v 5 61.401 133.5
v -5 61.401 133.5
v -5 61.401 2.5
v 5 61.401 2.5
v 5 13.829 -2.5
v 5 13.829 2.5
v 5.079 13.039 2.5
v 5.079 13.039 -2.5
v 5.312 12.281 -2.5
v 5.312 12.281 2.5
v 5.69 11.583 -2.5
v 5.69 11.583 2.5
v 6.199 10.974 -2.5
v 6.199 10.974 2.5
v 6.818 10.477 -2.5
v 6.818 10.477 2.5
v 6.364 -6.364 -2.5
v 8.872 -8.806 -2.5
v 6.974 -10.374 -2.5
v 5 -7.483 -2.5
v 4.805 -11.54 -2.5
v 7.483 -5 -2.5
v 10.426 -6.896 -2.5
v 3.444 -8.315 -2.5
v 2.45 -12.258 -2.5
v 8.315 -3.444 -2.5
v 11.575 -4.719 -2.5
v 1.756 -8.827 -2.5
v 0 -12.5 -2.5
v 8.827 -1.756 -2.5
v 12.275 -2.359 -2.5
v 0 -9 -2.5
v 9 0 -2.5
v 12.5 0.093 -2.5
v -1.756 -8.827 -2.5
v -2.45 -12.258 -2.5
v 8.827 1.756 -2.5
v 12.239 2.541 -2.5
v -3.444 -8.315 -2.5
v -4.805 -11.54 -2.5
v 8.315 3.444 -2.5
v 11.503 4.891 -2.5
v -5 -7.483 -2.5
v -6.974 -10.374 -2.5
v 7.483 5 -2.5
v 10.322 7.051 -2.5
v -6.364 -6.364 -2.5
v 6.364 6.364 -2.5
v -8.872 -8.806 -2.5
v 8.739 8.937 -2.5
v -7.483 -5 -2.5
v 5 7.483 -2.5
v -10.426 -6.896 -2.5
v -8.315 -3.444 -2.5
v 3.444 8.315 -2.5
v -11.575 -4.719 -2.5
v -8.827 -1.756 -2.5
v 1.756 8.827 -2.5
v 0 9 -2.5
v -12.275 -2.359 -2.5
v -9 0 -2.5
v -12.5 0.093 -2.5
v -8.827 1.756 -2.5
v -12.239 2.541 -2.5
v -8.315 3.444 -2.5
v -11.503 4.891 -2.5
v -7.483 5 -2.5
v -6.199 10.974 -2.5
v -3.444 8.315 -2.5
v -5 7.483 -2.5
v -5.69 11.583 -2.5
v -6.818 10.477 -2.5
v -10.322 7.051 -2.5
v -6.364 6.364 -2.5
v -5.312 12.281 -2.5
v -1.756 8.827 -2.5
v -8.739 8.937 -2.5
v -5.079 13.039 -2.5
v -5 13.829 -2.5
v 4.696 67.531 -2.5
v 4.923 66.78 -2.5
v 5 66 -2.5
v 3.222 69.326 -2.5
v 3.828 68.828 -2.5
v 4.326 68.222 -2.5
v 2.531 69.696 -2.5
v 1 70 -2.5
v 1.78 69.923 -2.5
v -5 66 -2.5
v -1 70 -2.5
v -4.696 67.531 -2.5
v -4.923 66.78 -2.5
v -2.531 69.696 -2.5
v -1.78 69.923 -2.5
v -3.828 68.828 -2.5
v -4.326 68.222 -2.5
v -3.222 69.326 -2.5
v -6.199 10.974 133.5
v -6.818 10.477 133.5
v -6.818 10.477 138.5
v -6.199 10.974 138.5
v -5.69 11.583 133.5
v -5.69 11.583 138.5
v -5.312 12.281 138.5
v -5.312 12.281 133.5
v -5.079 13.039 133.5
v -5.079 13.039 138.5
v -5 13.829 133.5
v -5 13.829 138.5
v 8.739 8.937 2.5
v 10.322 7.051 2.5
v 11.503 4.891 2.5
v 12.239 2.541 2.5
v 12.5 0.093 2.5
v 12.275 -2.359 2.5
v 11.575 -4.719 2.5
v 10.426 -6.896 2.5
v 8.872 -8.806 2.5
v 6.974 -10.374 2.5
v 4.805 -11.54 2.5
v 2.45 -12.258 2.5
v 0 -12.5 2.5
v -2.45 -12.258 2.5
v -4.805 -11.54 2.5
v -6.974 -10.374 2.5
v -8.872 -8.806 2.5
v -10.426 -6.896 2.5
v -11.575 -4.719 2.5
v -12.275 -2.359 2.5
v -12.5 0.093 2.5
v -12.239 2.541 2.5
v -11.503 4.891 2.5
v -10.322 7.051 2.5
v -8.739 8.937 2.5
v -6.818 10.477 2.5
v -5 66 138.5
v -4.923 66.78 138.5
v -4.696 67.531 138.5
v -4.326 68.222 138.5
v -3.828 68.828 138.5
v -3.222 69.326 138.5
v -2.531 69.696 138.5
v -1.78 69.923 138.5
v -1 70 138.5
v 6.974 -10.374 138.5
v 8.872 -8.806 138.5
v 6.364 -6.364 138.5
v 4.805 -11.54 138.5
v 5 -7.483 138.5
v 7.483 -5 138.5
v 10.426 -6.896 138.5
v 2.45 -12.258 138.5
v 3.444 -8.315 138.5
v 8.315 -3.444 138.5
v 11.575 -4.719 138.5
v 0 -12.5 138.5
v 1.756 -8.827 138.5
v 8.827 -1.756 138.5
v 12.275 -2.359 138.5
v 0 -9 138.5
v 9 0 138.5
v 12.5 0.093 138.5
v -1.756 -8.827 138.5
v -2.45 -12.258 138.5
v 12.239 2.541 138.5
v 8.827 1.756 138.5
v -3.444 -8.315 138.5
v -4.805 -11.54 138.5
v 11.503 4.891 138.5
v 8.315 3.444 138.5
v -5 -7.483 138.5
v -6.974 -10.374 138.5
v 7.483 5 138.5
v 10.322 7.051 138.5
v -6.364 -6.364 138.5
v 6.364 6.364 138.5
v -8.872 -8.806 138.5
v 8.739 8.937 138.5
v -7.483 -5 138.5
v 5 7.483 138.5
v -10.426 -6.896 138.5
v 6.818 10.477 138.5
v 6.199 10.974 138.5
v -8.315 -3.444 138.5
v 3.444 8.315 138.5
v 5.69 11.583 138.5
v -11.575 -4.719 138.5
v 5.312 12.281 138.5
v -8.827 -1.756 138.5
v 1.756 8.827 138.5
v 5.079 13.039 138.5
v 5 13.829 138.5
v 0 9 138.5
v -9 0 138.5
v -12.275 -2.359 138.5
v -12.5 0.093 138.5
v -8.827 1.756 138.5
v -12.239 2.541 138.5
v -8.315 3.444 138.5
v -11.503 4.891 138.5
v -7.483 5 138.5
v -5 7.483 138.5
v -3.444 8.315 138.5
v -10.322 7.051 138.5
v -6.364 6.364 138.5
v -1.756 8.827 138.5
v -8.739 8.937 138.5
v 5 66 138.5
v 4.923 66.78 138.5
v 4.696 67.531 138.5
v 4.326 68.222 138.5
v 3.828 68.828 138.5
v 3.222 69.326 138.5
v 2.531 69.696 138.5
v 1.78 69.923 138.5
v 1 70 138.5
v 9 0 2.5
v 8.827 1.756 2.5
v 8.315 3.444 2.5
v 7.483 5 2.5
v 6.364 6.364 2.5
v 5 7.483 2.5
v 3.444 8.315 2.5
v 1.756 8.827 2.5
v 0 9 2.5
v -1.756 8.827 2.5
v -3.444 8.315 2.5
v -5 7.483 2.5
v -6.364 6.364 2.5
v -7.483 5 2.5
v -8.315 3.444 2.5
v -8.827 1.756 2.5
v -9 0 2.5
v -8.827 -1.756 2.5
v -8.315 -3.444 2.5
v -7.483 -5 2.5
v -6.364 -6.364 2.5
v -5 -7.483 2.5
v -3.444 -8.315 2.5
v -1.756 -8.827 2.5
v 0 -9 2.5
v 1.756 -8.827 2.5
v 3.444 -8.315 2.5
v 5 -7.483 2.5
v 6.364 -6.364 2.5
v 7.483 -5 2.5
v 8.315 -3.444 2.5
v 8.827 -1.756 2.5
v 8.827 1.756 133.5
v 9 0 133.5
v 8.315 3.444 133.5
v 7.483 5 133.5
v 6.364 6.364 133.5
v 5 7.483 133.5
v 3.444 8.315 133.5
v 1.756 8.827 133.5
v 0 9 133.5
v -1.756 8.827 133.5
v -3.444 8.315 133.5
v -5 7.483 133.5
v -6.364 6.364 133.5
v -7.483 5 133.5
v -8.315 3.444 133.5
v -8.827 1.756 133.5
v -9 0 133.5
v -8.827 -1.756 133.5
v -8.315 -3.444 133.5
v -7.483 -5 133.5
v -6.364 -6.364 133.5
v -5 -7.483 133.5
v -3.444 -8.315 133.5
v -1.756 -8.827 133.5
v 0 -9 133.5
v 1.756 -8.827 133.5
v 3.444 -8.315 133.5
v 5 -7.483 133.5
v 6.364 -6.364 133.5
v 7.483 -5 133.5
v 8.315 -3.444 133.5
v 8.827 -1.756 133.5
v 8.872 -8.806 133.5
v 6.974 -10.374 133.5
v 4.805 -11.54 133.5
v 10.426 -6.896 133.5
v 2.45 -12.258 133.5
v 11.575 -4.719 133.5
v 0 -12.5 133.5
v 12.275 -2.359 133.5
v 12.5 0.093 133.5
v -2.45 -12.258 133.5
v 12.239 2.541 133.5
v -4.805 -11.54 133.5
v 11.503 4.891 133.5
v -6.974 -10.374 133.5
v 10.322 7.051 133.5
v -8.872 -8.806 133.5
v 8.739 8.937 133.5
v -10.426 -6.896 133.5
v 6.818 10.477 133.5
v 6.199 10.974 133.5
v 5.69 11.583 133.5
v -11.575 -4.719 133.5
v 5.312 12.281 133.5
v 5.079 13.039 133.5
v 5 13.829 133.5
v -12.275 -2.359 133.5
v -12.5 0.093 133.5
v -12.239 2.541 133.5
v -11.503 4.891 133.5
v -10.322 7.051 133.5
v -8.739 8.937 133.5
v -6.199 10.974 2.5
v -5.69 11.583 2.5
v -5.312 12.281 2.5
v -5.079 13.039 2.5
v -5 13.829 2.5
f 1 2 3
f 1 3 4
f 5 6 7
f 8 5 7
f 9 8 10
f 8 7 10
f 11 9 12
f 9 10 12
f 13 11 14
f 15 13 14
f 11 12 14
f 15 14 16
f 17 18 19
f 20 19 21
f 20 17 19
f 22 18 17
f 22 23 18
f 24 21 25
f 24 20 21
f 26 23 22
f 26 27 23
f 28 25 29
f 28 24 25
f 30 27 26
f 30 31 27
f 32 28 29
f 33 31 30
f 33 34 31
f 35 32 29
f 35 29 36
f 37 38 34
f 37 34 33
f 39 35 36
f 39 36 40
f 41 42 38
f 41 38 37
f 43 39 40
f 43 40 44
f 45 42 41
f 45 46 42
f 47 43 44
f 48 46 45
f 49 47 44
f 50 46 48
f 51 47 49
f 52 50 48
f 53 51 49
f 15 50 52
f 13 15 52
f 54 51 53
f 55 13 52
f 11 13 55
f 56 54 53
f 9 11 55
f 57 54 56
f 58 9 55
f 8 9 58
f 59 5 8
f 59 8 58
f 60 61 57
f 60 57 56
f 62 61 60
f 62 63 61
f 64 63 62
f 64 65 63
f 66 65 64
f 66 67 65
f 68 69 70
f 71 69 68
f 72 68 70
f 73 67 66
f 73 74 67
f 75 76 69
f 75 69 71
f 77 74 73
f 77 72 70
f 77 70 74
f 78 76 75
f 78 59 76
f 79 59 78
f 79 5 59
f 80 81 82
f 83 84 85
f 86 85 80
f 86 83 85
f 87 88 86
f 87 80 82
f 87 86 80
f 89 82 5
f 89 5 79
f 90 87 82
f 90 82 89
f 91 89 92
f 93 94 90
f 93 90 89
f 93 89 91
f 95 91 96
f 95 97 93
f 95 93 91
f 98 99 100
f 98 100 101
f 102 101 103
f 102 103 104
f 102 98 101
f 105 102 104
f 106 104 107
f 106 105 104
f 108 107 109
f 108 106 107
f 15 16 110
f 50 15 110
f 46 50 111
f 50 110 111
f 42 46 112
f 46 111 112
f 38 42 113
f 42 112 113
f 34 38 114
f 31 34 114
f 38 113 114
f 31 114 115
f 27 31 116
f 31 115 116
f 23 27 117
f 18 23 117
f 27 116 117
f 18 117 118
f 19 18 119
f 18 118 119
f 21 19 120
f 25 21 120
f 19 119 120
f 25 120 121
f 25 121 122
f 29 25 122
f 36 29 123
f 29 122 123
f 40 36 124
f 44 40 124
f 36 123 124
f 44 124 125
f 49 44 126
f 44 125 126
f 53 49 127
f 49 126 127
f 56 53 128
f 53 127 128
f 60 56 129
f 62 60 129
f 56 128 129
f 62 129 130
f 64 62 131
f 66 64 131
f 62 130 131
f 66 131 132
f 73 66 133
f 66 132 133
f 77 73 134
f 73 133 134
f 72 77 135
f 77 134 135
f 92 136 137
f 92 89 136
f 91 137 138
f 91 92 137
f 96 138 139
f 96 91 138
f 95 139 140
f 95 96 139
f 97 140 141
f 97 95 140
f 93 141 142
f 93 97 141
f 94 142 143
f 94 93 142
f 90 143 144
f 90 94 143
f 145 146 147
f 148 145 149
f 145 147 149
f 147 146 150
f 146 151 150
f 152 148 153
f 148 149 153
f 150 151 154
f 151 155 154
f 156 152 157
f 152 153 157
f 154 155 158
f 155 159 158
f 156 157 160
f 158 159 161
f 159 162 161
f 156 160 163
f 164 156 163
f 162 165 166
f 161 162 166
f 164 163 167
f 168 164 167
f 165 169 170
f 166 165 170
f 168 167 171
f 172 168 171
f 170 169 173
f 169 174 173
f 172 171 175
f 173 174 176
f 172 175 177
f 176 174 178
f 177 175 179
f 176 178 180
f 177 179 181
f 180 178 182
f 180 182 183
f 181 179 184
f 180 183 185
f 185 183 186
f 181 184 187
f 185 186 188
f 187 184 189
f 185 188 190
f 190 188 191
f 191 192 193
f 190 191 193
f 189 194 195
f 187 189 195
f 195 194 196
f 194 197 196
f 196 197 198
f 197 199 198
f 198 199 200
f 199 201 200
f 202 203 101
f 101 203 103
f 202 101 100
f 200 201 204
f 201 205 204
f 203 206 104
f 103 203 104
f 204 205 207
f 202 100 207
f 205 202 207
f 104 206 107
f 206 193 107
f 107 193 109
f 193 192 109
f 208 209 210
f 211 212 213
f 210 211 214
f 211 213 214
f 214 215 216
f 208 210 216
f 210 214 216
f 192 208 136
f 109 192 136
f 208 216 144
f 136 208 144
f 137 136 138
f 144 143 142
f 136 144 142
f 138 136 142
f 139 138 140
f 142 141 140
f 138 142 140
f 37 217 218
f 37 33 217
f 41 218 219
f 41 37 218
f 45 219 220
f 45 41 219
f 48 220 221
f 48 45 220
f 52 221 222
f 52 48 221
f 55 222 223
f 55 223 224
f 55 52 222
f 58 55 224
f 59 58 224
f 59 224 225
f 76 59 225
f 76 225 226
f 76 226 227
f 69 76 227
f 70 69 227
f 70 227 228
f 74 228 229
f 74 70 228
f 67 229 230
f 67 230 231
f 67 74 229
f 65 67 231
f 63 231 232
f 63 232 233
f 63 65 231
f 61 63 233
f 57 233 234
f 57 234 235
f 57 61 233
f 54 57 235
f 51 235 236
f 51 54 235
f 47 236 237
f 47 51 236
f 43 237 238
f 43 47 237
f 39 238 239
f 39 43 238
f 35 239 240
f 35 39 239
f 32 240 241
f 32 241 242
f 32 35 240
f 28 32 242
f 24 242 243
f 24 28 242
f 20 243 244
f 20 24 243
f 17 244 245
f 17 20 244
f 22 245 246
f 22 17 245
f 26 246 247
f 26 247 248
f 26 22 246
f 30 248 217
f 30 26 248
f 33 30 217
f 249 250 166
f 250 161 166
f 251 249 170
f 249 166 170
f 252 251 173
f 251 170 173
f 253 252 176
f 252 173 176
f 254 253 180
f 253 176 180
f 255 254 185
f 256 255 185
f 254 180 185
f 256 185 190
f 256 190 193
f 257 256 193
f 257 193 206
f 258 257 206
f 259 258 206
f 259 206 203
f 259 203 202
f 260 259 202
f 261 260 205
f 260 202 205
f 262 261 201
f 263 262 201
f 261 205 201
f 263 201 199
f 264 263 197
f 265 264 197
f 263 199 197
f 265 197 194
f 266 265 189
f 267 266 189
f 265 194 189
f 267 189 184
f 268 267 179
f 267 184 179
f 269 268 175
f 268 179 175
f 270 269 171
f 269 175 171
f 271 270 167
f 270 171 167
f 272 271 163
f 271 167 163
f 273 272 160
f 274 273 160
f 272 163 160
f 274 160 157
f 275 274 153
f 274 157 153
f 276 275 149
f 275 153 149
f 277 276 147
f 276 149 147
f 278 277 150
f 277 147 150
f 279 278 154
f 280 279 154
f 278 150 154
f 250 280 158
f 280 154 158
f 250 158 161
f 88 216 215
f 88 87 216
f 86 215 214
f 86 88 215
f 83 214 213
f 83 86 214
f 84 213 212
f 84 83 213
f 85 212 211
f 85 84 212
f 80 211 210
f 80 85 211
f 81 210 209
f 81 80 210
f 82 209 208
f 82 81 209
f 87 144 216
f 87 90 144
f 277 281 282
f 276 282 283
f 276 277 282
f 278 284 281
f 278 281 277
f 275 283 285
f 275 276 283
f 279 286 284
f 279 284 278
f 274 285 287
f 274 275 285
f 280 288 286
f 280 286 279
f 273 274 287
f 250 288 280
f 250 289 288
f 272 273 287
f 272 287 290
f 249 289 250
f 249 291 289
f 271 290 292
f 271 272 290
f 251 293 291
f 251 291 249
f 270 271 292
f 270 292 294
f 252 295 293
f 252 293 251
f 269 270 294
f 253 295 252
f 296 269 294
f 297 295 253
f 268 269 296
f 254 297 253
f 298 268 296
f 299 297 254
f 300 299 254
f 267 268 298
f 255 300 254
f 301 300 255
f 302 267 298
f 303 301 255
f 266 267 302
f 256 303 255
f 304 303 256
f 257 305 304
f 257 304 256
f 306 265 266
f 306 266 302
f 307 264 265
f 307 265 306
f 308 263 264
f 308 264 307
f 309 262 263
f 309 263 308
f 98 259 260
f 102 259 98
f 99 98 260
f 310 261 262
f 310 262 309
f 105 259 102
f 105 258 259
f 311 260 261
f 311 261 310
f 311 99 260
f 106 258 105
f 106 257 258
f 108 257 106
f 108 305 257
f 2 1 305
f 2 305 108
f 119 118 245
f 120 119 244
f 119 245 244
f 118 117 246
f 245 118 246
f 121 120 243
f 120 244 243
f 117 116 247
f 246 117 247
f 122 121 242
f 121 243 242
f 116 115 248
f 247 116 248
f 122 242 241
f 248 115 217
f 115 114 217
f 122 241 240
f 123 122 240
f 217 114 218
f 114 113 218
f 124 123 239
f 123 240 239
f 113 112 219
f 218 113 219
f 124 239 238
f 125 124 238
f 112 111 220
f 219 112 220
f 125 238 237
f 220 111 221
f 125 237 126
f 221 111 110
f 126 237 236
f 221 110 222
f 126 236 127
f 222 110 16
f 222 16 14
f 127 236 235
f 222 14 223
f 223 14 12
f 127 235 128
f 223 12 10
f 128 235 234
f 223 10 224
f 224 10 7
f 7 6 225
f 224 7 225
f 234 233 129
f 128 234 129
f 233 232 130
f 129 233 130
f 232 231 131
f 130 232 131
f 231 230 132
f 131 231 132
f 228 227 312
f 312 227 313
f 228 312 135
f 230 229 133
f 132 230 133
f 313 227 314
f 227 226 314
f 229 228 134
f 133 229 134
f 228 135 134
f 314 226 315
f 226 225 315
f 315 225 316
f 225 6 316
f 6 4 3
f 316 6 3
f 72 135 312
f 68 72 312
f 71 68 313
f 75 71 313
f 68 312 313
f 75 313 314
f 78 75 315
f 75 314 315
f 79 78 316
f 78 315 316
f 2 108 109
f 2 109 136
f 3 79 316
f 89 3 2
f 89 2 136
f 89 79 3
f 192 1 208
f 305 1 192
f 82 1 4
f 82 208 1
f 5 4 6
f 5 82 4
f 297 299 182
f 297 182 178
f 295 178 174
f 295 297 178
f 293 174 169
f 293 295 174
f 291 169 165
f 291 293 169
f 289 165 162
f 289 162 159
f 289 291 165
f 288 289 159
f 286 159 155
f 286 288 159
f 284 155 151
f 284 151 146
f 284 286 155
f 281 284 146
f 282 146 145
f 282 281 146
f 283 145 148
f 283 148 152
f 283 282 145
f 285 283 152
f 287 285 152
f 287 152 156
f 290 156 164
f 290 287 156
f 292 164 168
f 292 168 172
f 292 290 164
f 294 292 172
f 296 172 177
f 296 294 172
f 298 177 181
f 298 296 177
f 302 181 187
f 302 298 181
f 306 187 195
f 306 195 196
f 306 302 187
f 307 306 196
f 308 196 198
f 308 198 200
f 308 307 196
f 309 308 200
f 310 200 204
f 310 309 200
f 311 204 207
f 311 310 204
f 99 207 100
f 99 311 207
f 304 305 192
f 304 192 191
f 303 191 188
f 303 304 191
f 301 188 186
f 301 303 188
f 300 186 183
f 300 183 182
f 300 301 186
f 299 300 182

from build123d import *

# Parameters (mm, degrees)
SKETCH1_R           = 9
BOSS_EXTRUDE1_DEPTH = 2.5
BOSS_EXTRUDE2_START = 131
BOSS_EXTRUDE2_DEPTH = 131


with BuildPart() as part:
    # Sketch1 → Boss-Extrude1 (new, symmetric)
    with BuildSketch(Plane.XY):
        with BuildLine():
            Line((-5, 13.829316686), (-5, 66))
            ThreePointArc((-5, 66), (-3.828427125, 68.828427125), (-1, 70))
            Line((-1, 70), (1, 70))
            ThreePointArc((1, 70), (3.828427125, 68.828427125), (5, 66))
            Line((5, 66), (5, 13.829316686))
            ThreePointArc((5, 13.829316686), (5.483803708, 11.922391507), (6.818181818, 10.476755065))
            ThreePointArc((6.818181818, 10.476755065), (0, -12.5), (-6.818181818, 10.476755065))
            ThreePointArc((-6.818181818, 10.476755065), (-5.483803708, 11.922391507), (-5, 13.829316686))
        make_face()
        Circle(SKETCH1_R, mode=Mode.SUBTRACT)
    boss_extrude1 = extrude(amount=BOSS_EXTRUDE1_DEPTH, both=True)

    # Sketch2 → Boss-Extrude2 (add)
    with BuildSketch(Plane.XY.offset(2.5).offset(BOSS_EXTRUDE2_START)):
        with BuildLine():
            Line((-5, 66), (-5, 61.401358418))
            Line((-5, 61.401358418), (5, 61.401358418))
            Line((5, 61.401358418), (5, 66))
            ThreePointArc((5, 66), (3.828427125, 68.828427125), (1, 70))
            Line((1, 70), (-1, 70))
            ThreePointArc((-1, 70), (-3.828427125, 68.828427125), (-5, 66))
        make_face()
    extrude(amount=-BOSS_EXTRUDE2_DEPTH)

    # Mirror1: Boss-Extrude1 across plane
    add(boss_extrude1.mirror(Plane.XY.offset(68)))


solid = part.part
